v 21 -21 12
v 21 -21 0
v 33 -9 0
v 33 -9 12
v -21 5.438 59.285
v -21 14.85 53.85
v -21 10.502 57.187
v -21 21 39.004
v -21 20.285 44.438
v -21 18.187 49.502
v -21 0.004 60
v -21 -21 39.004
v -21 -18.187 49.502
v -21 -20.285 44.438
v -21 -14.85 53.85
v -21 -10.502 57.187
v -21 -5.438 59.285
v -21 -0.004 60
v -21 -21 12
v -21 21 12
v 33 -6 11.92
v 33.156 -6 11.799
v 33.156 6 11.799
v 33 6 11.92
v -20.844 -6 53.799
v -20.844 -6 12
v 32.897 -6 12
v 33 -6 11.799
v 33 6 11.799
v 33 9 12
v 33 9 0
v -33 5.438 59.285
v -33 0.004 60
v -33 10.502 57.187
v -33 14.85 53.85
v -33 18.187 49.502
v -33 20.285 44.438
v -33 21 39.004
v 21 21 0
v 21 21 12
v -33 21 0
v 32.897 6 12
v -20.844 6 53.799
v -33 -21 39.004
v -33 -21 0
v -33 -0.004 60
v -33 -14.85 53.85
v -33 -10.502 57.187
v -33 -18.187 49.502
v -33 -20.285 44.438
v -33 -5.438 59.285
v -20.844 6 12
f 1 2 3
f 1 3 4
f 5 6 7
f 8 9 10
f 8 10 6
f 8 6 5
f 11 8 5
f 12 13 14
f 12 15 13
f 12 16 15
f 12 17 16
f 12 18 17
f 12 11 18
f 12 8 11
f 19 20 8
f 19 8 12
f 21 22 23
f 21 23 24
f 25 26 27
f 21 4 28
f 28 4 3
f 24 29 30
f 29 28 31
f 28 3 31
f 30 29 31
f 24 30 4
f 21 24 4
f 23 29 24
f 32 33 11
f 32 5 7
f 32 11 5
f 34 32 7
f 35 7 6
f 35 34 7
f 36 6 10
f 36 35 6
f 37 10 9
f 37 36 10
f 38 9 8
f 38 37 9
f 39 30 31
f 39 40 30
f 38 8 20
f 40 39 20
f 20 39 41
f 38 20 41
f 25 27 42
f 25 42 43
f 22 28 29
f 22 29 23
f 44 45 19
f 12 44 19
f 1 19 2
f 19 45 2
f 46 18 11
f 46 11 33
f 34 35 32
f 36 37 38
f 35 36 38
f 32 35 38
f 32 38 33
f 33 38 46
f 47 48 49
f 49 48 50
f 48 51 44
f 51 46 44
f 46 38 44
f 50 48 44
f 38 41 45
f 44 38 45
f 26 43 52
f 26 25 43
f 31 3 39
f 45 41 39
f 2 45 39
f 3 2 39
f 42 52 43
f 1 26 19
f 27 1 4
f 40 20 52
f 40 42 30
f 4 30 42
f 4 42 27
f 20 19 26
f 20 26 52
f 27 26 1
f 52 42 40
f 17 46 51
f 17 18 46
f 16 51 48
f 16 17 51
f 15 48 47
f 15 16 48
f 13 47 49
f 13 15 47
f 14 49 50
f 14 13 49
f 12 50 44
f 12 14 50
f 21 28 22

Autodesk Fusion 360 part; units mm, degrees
sketch "Sketch1" plane through (0, 0, 0) normal (0, 0, 1) x (1, 0, 0)
  line L0 (33, 21) -> (-33, 21)
  line L1 (-33, 21) -> (-33, -21)
  line L2 (-33, -21) -> (33, -21)
  line L3 (33, -21) -> (33, 21)
  line L4 (33, 21) -> (-33, -21) construction
  line L5 (-33, 21) -> (33, -21) construction
  dimension "d1" = 66
  dimension "d2" = 42
extrude "Extrude1" add sketch "Sketch1" along normal blind 12
chamfer "Chamfer1" distance 12 angle 45 2 edges at (33, -21, 6) (33, 21, 6)
sketch "Sketch2" plane through (0, 0, 12) normal (0, 0, 1) x (-1, 0, 0)
  line L0 (-33, -9) -> (-21, -21)
  line L1 (-21, -21) -> (33, -21)
  line L2 (33, -21) -> (33, 21)
  line L3 (33, 21) -> (-21, 21)
  line L4 (-21, 21) -> (-33, 9)
  line L5 (-33, 9) -> (-33, -9)
  line L6 (33, -21) -> (21, -21)
  line L7 (21, -21) -> (21, 21)
  line L8 (21, 21) -> (33, 21)
  line L9 (33, 21) -> (33, -21)
  dimension "d6" = 12
extrude "Extrude2" add sketch "Sketch2" along normal blind 48 contours L1 L2 L3 L6 L7 L8 L9
fillet "Fillet1" radius 21 2 edges at (-27, 21, 60) (-27, -21, 60)
sketch "Sketch3" plane through (0, 0, 0) normal (0, 1, 0) x (1, 0, 0)
  line L0 (-20.8442, -53.799) -> (-20.8442, -11.799)
  line L1 (-20.8442, -11.799) -> (33.1558, -11.799)
  line L2 (33.1558, -11.799) -> (-20.8442, -53.799)
  dimension "d11" = 42
  dimension "d12" = 54
extrude "Extrude3" add sketch "Sketch3" along normal mid plane 12
equation "d7 = 60 mm - 12 mm"
equation "d12 = 66 mm - 12 mm"
